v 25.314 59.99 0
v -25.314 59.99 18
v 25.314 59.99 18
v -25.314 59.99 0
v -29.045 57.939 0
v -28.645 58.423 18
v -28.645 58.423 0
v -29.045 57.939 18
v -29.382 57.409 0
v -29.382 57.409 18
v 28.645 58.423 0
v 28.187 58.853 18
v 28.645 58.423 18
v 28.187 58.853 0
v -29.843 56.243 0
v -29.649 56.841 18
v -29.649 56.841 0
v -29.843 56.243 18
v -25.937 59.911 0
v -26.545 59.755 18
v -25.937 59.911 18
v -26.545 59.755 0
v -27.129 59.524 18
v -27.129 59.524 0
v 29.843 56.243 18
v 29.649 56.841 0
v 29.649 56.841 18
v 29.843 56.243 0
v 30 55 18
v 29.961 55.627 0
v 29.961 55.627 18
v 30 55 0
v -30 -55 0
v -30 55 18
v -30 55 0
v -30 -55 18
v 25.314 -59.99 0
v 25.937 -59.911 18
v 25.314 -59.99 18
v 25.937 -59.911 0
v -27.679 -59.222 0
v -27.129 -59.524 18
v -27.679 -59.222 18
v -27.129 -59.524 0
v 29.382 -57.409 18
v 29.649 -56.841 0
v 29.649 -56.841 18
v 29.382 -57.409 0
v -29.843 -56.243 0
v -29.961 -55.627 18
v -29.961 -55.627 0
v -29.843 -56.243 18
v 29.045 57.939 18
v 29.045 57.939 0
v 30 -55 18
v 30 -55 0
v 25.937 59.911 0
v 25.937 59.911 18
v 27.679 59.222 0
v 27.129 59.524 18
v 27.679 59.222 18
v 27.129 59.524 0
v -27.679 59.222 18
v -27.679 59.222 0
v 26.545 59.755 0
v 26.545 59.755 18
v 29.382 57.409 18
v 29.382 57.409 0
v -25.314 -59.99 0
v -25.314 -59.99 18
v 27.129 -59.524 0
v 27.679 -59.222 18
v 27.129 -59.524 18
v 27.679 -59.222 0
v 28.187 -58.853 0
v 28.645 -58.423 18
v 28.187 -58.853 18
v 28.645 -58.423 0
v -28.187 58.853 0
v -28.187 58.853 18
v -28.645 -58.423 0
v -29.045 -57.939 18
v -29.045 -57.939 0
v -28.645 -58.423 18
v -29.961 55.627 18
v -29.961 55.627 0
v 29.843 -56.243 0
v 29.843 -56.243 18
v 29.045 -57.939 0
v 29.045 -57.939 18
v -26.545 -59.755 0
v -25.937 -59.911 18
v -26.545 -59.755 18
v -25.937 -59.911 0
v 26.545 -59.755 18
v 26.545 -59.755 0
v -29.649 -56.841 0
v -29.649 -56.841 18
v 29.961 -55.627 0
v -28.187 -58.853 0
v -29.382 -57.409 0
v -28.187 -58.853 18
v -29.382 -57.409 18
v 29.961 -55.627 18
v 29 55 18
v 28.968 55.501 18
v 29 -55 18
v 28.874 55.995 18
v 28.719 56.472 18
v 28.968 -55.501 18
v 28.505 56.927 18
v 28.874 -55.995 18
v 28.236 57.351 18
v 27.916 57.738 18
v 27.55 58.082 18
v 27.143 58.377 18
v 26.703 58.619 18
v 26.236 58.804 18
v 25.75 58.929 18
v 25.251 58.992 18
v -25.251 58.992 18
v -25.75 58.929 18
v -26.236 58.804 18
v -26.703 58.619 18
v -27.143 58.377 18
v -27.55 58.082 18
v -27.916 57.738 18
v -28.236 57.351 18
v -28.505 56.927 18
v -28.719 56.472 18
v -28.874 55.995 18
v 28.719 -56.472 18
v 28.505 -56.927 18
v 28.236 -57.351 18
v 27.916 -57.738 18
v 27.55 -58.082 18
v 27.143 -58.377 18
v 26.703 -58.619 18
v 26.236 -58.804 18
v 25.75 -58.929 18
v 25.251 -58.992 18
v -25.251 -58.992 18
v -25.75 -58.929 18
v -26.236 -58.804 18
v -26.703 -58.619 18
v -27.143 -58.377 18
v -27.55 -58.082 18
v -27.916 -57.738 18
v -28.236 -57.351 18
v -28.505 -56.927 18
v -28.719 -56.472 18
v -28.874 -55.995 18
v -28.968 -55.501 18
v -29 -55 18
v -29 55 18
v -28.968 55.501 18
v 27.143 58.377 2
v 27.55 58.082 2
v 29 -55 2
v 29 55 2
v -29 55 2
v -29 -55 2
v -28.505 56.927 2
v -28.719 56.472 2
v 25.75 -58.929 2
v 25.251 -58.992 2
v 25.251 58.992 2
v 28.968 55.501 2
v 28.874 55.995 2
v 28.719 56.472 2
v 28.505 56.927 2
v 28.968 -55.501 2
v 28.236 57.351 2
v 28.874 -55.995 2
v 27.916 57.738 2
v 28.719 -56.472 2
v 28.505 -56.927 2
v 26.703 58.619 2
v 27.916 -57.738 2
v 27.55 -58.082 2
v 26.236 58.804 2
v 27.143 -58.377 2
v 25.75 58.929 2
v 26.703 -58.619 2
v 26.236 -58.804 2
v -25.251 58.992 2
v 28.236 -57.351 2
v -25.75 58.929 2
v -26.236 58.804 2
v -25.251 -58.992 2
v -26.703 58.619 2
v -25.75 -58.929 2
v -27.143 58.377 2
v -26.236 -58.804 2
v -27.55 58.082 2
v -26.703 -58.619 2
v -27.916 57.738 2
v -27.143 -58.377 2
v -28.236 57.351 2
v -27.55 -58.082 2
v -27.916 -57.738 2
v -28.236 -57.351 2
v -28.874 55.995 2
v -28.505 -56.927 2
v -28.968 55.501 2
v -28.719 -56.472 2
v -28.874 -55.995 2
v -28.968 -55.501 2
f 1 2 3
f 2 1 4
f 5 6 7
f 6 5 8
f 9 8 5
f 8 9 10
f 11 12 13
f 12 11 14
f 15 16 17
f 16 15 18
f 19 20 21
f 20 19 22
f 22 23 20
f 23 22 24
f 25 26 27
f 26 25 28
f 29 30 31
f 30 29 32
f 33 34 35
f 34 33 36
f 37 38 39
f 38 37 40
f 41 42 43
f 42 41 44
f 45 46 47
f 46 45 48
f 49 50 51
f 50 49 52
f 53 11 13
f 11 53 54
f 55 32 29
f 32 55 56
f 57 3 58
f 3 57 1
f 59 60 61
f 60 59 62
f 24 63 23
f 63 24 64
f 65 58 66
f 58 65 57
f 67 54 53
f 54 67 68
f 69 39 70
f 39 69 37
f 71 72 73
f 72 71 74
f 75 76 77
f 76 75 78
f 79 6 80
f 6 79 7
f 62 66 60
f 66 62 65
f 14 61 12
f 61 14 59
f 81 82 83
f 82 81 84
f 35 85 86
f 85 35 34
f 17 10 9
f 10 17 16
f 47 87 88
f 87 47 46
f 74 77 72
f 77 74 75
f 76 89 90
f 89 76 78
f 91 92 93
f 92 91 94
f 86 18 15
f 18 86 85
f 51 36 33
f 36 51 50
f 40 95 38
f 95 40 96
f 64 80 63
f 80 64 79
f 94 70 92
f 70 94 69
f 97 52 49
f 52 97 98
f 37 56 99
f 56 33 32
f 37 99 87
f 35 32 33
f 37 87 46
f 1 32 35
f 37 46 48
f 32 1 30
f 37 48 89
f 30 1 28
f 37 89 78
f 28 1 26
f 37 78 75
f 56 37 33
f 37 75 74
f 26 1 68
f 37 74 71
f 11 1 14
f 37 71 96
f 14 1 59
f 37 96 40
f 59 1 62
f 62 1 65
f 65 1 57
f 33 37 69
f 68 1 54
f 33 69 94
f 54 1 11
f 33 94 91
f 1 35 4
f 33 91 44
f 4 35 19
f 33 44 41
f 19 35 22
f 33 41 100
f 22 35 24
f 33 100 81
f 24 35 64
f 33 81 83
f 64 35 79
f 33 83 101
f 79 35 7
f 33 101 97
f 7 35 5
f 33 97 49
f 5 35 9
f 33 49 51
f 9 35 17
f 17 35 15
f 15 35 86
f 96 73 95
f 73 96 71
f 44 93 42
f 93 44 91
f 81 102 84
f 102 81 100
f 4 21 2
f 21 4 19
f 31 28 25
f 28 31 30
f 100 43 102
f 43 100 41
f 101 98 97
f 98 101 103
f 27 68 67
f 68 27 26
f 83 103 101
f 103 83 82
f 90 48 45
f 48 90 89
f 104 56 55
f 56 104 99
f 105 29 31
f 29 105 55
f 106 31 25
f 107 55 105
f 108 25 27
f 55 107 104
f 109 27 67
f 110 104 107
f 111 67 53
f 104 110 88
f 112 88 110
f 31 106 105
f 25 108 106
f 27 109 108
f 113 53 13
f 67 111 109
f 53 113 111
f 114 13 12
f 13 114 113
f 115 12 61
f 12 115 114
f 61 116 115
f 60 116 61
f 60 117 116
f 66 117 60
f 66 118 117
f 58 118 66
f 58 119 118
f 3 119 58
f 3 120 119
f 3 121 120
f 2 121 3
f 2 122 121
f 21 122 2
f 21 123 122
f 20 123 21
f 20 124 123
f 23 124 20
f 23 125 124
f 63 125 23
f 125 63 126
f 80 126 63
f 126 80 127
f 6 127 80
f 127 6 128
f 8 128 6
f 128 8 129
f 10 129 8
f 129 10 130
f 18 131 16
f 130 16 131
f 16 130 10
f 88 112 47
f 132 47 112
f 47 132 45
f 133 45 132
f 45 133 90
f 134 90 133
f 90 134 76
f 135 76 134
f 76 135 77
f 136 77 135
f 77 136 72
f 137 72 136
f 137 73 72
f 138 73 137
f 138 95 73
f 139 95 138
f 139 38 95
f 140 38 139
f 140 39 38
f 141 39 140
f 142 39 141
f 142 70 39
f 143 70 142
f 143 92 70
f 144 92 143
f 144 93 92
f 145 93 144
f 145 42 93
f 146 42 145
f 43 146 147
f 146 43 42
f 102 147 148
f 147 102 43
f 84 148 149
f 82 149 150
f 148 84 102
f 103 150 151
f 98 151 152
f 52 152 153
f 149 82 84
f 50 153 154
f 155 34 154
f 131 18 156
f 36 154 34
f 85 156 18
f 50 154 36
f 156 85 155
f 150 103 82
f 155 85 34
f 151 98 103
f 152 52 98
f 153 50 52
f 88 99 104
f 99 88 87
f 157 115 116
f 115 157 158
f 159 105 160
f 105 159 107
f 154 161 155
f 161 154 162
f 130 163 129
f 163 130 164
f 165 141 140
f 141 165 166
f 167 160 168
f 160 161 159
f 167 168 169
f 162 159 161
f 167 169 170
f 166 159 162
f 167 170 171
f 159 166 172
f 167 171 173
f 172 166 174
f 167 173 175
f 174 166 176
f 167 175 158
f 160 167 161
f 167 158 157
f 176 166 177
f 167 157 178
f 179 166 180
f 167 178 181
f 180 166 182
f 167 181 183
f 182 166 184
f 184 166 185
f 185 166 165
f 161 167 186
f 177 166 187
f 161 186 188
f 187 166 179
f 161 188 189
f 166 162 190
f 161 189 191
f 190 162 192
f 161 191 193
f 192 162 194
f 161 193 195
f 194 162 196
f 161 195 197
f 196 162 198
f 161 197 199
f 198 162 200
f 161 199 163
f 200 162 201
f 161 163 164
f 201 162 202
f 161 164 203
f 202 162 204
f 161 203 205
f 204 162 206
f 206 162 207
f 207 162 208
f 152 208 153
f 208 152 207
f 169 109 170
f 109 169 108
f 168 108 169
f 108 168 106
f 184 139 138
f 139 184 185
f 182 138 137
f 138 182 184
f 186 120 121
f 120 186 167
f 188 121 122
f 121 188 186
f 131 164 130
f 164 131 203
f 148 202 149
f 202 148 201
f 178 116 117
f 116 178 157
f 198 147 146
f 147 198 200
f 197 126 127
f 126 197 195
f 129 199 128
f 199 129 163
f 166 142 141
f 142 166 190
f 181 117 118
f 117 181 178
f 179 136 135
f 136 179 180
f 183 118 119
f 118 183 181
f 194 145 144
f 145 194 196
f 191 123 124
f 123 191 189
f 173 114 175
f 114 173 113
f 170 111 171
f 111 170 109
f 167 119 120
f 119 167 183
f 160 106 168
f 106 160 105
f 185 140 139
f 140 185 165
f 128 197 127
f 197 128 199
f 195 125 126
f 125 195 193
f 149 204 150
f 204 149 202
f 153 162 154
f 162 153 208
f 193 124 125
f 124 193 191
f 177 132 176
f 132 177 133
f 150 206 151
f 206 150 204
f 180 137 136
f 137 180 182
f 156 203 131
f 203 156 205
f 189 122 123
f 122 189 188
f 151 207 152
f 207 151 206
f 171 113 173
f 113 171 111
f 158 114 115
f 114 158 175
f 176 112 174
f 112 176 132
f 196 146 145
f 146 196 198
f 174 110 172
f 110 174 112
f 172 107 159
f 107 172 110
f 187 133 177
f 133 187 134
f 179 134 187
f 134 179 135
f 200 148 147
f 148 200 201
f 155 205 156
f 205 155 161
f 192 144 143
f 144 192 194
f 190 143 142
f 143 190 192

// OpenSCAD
$fn = 50;


difference() {
	union() {
		hull() {
			translate(v = [-25.0000000000, 55.0000000000, 0]) {
				cylinder(h = 18, r = 5);
			}
			translate(v = [25.0000000000, 55.0000000000, 0]) {
				cylinder(h = 18, r = 5);
			}
			translate(v = [-25.0000000000, -55.0000000000, 0]) {
				cylinder(h = 18, r = 5);
			}
			translate(v = [25.0000000000, -55.0000000000, 0]) {
				cylinder(h = 18, r = 5);
			}
		}
	}
	union() {
		translate(v = [0, 0, 2]) {
			hull() {
				translate(v = [-25.0000000000, 55.0000000000, 0]) {
					cylinder(h = 16, r = 4);
				}
				translate(v = [25.0000000000, 55.0000000000, 0]) {
					cylinder(h = 16, r = 4);
				}
				translate(v = [-25.0000000000, -55.0000000000, 0]) {
					cylinder(h = 16, r = 4);
				}
				translate(v = [25.0000000000, -55.0000000000, 0]) {
					cylinder(h = 16, r = 4);
				}
			}
		}
	}
}
